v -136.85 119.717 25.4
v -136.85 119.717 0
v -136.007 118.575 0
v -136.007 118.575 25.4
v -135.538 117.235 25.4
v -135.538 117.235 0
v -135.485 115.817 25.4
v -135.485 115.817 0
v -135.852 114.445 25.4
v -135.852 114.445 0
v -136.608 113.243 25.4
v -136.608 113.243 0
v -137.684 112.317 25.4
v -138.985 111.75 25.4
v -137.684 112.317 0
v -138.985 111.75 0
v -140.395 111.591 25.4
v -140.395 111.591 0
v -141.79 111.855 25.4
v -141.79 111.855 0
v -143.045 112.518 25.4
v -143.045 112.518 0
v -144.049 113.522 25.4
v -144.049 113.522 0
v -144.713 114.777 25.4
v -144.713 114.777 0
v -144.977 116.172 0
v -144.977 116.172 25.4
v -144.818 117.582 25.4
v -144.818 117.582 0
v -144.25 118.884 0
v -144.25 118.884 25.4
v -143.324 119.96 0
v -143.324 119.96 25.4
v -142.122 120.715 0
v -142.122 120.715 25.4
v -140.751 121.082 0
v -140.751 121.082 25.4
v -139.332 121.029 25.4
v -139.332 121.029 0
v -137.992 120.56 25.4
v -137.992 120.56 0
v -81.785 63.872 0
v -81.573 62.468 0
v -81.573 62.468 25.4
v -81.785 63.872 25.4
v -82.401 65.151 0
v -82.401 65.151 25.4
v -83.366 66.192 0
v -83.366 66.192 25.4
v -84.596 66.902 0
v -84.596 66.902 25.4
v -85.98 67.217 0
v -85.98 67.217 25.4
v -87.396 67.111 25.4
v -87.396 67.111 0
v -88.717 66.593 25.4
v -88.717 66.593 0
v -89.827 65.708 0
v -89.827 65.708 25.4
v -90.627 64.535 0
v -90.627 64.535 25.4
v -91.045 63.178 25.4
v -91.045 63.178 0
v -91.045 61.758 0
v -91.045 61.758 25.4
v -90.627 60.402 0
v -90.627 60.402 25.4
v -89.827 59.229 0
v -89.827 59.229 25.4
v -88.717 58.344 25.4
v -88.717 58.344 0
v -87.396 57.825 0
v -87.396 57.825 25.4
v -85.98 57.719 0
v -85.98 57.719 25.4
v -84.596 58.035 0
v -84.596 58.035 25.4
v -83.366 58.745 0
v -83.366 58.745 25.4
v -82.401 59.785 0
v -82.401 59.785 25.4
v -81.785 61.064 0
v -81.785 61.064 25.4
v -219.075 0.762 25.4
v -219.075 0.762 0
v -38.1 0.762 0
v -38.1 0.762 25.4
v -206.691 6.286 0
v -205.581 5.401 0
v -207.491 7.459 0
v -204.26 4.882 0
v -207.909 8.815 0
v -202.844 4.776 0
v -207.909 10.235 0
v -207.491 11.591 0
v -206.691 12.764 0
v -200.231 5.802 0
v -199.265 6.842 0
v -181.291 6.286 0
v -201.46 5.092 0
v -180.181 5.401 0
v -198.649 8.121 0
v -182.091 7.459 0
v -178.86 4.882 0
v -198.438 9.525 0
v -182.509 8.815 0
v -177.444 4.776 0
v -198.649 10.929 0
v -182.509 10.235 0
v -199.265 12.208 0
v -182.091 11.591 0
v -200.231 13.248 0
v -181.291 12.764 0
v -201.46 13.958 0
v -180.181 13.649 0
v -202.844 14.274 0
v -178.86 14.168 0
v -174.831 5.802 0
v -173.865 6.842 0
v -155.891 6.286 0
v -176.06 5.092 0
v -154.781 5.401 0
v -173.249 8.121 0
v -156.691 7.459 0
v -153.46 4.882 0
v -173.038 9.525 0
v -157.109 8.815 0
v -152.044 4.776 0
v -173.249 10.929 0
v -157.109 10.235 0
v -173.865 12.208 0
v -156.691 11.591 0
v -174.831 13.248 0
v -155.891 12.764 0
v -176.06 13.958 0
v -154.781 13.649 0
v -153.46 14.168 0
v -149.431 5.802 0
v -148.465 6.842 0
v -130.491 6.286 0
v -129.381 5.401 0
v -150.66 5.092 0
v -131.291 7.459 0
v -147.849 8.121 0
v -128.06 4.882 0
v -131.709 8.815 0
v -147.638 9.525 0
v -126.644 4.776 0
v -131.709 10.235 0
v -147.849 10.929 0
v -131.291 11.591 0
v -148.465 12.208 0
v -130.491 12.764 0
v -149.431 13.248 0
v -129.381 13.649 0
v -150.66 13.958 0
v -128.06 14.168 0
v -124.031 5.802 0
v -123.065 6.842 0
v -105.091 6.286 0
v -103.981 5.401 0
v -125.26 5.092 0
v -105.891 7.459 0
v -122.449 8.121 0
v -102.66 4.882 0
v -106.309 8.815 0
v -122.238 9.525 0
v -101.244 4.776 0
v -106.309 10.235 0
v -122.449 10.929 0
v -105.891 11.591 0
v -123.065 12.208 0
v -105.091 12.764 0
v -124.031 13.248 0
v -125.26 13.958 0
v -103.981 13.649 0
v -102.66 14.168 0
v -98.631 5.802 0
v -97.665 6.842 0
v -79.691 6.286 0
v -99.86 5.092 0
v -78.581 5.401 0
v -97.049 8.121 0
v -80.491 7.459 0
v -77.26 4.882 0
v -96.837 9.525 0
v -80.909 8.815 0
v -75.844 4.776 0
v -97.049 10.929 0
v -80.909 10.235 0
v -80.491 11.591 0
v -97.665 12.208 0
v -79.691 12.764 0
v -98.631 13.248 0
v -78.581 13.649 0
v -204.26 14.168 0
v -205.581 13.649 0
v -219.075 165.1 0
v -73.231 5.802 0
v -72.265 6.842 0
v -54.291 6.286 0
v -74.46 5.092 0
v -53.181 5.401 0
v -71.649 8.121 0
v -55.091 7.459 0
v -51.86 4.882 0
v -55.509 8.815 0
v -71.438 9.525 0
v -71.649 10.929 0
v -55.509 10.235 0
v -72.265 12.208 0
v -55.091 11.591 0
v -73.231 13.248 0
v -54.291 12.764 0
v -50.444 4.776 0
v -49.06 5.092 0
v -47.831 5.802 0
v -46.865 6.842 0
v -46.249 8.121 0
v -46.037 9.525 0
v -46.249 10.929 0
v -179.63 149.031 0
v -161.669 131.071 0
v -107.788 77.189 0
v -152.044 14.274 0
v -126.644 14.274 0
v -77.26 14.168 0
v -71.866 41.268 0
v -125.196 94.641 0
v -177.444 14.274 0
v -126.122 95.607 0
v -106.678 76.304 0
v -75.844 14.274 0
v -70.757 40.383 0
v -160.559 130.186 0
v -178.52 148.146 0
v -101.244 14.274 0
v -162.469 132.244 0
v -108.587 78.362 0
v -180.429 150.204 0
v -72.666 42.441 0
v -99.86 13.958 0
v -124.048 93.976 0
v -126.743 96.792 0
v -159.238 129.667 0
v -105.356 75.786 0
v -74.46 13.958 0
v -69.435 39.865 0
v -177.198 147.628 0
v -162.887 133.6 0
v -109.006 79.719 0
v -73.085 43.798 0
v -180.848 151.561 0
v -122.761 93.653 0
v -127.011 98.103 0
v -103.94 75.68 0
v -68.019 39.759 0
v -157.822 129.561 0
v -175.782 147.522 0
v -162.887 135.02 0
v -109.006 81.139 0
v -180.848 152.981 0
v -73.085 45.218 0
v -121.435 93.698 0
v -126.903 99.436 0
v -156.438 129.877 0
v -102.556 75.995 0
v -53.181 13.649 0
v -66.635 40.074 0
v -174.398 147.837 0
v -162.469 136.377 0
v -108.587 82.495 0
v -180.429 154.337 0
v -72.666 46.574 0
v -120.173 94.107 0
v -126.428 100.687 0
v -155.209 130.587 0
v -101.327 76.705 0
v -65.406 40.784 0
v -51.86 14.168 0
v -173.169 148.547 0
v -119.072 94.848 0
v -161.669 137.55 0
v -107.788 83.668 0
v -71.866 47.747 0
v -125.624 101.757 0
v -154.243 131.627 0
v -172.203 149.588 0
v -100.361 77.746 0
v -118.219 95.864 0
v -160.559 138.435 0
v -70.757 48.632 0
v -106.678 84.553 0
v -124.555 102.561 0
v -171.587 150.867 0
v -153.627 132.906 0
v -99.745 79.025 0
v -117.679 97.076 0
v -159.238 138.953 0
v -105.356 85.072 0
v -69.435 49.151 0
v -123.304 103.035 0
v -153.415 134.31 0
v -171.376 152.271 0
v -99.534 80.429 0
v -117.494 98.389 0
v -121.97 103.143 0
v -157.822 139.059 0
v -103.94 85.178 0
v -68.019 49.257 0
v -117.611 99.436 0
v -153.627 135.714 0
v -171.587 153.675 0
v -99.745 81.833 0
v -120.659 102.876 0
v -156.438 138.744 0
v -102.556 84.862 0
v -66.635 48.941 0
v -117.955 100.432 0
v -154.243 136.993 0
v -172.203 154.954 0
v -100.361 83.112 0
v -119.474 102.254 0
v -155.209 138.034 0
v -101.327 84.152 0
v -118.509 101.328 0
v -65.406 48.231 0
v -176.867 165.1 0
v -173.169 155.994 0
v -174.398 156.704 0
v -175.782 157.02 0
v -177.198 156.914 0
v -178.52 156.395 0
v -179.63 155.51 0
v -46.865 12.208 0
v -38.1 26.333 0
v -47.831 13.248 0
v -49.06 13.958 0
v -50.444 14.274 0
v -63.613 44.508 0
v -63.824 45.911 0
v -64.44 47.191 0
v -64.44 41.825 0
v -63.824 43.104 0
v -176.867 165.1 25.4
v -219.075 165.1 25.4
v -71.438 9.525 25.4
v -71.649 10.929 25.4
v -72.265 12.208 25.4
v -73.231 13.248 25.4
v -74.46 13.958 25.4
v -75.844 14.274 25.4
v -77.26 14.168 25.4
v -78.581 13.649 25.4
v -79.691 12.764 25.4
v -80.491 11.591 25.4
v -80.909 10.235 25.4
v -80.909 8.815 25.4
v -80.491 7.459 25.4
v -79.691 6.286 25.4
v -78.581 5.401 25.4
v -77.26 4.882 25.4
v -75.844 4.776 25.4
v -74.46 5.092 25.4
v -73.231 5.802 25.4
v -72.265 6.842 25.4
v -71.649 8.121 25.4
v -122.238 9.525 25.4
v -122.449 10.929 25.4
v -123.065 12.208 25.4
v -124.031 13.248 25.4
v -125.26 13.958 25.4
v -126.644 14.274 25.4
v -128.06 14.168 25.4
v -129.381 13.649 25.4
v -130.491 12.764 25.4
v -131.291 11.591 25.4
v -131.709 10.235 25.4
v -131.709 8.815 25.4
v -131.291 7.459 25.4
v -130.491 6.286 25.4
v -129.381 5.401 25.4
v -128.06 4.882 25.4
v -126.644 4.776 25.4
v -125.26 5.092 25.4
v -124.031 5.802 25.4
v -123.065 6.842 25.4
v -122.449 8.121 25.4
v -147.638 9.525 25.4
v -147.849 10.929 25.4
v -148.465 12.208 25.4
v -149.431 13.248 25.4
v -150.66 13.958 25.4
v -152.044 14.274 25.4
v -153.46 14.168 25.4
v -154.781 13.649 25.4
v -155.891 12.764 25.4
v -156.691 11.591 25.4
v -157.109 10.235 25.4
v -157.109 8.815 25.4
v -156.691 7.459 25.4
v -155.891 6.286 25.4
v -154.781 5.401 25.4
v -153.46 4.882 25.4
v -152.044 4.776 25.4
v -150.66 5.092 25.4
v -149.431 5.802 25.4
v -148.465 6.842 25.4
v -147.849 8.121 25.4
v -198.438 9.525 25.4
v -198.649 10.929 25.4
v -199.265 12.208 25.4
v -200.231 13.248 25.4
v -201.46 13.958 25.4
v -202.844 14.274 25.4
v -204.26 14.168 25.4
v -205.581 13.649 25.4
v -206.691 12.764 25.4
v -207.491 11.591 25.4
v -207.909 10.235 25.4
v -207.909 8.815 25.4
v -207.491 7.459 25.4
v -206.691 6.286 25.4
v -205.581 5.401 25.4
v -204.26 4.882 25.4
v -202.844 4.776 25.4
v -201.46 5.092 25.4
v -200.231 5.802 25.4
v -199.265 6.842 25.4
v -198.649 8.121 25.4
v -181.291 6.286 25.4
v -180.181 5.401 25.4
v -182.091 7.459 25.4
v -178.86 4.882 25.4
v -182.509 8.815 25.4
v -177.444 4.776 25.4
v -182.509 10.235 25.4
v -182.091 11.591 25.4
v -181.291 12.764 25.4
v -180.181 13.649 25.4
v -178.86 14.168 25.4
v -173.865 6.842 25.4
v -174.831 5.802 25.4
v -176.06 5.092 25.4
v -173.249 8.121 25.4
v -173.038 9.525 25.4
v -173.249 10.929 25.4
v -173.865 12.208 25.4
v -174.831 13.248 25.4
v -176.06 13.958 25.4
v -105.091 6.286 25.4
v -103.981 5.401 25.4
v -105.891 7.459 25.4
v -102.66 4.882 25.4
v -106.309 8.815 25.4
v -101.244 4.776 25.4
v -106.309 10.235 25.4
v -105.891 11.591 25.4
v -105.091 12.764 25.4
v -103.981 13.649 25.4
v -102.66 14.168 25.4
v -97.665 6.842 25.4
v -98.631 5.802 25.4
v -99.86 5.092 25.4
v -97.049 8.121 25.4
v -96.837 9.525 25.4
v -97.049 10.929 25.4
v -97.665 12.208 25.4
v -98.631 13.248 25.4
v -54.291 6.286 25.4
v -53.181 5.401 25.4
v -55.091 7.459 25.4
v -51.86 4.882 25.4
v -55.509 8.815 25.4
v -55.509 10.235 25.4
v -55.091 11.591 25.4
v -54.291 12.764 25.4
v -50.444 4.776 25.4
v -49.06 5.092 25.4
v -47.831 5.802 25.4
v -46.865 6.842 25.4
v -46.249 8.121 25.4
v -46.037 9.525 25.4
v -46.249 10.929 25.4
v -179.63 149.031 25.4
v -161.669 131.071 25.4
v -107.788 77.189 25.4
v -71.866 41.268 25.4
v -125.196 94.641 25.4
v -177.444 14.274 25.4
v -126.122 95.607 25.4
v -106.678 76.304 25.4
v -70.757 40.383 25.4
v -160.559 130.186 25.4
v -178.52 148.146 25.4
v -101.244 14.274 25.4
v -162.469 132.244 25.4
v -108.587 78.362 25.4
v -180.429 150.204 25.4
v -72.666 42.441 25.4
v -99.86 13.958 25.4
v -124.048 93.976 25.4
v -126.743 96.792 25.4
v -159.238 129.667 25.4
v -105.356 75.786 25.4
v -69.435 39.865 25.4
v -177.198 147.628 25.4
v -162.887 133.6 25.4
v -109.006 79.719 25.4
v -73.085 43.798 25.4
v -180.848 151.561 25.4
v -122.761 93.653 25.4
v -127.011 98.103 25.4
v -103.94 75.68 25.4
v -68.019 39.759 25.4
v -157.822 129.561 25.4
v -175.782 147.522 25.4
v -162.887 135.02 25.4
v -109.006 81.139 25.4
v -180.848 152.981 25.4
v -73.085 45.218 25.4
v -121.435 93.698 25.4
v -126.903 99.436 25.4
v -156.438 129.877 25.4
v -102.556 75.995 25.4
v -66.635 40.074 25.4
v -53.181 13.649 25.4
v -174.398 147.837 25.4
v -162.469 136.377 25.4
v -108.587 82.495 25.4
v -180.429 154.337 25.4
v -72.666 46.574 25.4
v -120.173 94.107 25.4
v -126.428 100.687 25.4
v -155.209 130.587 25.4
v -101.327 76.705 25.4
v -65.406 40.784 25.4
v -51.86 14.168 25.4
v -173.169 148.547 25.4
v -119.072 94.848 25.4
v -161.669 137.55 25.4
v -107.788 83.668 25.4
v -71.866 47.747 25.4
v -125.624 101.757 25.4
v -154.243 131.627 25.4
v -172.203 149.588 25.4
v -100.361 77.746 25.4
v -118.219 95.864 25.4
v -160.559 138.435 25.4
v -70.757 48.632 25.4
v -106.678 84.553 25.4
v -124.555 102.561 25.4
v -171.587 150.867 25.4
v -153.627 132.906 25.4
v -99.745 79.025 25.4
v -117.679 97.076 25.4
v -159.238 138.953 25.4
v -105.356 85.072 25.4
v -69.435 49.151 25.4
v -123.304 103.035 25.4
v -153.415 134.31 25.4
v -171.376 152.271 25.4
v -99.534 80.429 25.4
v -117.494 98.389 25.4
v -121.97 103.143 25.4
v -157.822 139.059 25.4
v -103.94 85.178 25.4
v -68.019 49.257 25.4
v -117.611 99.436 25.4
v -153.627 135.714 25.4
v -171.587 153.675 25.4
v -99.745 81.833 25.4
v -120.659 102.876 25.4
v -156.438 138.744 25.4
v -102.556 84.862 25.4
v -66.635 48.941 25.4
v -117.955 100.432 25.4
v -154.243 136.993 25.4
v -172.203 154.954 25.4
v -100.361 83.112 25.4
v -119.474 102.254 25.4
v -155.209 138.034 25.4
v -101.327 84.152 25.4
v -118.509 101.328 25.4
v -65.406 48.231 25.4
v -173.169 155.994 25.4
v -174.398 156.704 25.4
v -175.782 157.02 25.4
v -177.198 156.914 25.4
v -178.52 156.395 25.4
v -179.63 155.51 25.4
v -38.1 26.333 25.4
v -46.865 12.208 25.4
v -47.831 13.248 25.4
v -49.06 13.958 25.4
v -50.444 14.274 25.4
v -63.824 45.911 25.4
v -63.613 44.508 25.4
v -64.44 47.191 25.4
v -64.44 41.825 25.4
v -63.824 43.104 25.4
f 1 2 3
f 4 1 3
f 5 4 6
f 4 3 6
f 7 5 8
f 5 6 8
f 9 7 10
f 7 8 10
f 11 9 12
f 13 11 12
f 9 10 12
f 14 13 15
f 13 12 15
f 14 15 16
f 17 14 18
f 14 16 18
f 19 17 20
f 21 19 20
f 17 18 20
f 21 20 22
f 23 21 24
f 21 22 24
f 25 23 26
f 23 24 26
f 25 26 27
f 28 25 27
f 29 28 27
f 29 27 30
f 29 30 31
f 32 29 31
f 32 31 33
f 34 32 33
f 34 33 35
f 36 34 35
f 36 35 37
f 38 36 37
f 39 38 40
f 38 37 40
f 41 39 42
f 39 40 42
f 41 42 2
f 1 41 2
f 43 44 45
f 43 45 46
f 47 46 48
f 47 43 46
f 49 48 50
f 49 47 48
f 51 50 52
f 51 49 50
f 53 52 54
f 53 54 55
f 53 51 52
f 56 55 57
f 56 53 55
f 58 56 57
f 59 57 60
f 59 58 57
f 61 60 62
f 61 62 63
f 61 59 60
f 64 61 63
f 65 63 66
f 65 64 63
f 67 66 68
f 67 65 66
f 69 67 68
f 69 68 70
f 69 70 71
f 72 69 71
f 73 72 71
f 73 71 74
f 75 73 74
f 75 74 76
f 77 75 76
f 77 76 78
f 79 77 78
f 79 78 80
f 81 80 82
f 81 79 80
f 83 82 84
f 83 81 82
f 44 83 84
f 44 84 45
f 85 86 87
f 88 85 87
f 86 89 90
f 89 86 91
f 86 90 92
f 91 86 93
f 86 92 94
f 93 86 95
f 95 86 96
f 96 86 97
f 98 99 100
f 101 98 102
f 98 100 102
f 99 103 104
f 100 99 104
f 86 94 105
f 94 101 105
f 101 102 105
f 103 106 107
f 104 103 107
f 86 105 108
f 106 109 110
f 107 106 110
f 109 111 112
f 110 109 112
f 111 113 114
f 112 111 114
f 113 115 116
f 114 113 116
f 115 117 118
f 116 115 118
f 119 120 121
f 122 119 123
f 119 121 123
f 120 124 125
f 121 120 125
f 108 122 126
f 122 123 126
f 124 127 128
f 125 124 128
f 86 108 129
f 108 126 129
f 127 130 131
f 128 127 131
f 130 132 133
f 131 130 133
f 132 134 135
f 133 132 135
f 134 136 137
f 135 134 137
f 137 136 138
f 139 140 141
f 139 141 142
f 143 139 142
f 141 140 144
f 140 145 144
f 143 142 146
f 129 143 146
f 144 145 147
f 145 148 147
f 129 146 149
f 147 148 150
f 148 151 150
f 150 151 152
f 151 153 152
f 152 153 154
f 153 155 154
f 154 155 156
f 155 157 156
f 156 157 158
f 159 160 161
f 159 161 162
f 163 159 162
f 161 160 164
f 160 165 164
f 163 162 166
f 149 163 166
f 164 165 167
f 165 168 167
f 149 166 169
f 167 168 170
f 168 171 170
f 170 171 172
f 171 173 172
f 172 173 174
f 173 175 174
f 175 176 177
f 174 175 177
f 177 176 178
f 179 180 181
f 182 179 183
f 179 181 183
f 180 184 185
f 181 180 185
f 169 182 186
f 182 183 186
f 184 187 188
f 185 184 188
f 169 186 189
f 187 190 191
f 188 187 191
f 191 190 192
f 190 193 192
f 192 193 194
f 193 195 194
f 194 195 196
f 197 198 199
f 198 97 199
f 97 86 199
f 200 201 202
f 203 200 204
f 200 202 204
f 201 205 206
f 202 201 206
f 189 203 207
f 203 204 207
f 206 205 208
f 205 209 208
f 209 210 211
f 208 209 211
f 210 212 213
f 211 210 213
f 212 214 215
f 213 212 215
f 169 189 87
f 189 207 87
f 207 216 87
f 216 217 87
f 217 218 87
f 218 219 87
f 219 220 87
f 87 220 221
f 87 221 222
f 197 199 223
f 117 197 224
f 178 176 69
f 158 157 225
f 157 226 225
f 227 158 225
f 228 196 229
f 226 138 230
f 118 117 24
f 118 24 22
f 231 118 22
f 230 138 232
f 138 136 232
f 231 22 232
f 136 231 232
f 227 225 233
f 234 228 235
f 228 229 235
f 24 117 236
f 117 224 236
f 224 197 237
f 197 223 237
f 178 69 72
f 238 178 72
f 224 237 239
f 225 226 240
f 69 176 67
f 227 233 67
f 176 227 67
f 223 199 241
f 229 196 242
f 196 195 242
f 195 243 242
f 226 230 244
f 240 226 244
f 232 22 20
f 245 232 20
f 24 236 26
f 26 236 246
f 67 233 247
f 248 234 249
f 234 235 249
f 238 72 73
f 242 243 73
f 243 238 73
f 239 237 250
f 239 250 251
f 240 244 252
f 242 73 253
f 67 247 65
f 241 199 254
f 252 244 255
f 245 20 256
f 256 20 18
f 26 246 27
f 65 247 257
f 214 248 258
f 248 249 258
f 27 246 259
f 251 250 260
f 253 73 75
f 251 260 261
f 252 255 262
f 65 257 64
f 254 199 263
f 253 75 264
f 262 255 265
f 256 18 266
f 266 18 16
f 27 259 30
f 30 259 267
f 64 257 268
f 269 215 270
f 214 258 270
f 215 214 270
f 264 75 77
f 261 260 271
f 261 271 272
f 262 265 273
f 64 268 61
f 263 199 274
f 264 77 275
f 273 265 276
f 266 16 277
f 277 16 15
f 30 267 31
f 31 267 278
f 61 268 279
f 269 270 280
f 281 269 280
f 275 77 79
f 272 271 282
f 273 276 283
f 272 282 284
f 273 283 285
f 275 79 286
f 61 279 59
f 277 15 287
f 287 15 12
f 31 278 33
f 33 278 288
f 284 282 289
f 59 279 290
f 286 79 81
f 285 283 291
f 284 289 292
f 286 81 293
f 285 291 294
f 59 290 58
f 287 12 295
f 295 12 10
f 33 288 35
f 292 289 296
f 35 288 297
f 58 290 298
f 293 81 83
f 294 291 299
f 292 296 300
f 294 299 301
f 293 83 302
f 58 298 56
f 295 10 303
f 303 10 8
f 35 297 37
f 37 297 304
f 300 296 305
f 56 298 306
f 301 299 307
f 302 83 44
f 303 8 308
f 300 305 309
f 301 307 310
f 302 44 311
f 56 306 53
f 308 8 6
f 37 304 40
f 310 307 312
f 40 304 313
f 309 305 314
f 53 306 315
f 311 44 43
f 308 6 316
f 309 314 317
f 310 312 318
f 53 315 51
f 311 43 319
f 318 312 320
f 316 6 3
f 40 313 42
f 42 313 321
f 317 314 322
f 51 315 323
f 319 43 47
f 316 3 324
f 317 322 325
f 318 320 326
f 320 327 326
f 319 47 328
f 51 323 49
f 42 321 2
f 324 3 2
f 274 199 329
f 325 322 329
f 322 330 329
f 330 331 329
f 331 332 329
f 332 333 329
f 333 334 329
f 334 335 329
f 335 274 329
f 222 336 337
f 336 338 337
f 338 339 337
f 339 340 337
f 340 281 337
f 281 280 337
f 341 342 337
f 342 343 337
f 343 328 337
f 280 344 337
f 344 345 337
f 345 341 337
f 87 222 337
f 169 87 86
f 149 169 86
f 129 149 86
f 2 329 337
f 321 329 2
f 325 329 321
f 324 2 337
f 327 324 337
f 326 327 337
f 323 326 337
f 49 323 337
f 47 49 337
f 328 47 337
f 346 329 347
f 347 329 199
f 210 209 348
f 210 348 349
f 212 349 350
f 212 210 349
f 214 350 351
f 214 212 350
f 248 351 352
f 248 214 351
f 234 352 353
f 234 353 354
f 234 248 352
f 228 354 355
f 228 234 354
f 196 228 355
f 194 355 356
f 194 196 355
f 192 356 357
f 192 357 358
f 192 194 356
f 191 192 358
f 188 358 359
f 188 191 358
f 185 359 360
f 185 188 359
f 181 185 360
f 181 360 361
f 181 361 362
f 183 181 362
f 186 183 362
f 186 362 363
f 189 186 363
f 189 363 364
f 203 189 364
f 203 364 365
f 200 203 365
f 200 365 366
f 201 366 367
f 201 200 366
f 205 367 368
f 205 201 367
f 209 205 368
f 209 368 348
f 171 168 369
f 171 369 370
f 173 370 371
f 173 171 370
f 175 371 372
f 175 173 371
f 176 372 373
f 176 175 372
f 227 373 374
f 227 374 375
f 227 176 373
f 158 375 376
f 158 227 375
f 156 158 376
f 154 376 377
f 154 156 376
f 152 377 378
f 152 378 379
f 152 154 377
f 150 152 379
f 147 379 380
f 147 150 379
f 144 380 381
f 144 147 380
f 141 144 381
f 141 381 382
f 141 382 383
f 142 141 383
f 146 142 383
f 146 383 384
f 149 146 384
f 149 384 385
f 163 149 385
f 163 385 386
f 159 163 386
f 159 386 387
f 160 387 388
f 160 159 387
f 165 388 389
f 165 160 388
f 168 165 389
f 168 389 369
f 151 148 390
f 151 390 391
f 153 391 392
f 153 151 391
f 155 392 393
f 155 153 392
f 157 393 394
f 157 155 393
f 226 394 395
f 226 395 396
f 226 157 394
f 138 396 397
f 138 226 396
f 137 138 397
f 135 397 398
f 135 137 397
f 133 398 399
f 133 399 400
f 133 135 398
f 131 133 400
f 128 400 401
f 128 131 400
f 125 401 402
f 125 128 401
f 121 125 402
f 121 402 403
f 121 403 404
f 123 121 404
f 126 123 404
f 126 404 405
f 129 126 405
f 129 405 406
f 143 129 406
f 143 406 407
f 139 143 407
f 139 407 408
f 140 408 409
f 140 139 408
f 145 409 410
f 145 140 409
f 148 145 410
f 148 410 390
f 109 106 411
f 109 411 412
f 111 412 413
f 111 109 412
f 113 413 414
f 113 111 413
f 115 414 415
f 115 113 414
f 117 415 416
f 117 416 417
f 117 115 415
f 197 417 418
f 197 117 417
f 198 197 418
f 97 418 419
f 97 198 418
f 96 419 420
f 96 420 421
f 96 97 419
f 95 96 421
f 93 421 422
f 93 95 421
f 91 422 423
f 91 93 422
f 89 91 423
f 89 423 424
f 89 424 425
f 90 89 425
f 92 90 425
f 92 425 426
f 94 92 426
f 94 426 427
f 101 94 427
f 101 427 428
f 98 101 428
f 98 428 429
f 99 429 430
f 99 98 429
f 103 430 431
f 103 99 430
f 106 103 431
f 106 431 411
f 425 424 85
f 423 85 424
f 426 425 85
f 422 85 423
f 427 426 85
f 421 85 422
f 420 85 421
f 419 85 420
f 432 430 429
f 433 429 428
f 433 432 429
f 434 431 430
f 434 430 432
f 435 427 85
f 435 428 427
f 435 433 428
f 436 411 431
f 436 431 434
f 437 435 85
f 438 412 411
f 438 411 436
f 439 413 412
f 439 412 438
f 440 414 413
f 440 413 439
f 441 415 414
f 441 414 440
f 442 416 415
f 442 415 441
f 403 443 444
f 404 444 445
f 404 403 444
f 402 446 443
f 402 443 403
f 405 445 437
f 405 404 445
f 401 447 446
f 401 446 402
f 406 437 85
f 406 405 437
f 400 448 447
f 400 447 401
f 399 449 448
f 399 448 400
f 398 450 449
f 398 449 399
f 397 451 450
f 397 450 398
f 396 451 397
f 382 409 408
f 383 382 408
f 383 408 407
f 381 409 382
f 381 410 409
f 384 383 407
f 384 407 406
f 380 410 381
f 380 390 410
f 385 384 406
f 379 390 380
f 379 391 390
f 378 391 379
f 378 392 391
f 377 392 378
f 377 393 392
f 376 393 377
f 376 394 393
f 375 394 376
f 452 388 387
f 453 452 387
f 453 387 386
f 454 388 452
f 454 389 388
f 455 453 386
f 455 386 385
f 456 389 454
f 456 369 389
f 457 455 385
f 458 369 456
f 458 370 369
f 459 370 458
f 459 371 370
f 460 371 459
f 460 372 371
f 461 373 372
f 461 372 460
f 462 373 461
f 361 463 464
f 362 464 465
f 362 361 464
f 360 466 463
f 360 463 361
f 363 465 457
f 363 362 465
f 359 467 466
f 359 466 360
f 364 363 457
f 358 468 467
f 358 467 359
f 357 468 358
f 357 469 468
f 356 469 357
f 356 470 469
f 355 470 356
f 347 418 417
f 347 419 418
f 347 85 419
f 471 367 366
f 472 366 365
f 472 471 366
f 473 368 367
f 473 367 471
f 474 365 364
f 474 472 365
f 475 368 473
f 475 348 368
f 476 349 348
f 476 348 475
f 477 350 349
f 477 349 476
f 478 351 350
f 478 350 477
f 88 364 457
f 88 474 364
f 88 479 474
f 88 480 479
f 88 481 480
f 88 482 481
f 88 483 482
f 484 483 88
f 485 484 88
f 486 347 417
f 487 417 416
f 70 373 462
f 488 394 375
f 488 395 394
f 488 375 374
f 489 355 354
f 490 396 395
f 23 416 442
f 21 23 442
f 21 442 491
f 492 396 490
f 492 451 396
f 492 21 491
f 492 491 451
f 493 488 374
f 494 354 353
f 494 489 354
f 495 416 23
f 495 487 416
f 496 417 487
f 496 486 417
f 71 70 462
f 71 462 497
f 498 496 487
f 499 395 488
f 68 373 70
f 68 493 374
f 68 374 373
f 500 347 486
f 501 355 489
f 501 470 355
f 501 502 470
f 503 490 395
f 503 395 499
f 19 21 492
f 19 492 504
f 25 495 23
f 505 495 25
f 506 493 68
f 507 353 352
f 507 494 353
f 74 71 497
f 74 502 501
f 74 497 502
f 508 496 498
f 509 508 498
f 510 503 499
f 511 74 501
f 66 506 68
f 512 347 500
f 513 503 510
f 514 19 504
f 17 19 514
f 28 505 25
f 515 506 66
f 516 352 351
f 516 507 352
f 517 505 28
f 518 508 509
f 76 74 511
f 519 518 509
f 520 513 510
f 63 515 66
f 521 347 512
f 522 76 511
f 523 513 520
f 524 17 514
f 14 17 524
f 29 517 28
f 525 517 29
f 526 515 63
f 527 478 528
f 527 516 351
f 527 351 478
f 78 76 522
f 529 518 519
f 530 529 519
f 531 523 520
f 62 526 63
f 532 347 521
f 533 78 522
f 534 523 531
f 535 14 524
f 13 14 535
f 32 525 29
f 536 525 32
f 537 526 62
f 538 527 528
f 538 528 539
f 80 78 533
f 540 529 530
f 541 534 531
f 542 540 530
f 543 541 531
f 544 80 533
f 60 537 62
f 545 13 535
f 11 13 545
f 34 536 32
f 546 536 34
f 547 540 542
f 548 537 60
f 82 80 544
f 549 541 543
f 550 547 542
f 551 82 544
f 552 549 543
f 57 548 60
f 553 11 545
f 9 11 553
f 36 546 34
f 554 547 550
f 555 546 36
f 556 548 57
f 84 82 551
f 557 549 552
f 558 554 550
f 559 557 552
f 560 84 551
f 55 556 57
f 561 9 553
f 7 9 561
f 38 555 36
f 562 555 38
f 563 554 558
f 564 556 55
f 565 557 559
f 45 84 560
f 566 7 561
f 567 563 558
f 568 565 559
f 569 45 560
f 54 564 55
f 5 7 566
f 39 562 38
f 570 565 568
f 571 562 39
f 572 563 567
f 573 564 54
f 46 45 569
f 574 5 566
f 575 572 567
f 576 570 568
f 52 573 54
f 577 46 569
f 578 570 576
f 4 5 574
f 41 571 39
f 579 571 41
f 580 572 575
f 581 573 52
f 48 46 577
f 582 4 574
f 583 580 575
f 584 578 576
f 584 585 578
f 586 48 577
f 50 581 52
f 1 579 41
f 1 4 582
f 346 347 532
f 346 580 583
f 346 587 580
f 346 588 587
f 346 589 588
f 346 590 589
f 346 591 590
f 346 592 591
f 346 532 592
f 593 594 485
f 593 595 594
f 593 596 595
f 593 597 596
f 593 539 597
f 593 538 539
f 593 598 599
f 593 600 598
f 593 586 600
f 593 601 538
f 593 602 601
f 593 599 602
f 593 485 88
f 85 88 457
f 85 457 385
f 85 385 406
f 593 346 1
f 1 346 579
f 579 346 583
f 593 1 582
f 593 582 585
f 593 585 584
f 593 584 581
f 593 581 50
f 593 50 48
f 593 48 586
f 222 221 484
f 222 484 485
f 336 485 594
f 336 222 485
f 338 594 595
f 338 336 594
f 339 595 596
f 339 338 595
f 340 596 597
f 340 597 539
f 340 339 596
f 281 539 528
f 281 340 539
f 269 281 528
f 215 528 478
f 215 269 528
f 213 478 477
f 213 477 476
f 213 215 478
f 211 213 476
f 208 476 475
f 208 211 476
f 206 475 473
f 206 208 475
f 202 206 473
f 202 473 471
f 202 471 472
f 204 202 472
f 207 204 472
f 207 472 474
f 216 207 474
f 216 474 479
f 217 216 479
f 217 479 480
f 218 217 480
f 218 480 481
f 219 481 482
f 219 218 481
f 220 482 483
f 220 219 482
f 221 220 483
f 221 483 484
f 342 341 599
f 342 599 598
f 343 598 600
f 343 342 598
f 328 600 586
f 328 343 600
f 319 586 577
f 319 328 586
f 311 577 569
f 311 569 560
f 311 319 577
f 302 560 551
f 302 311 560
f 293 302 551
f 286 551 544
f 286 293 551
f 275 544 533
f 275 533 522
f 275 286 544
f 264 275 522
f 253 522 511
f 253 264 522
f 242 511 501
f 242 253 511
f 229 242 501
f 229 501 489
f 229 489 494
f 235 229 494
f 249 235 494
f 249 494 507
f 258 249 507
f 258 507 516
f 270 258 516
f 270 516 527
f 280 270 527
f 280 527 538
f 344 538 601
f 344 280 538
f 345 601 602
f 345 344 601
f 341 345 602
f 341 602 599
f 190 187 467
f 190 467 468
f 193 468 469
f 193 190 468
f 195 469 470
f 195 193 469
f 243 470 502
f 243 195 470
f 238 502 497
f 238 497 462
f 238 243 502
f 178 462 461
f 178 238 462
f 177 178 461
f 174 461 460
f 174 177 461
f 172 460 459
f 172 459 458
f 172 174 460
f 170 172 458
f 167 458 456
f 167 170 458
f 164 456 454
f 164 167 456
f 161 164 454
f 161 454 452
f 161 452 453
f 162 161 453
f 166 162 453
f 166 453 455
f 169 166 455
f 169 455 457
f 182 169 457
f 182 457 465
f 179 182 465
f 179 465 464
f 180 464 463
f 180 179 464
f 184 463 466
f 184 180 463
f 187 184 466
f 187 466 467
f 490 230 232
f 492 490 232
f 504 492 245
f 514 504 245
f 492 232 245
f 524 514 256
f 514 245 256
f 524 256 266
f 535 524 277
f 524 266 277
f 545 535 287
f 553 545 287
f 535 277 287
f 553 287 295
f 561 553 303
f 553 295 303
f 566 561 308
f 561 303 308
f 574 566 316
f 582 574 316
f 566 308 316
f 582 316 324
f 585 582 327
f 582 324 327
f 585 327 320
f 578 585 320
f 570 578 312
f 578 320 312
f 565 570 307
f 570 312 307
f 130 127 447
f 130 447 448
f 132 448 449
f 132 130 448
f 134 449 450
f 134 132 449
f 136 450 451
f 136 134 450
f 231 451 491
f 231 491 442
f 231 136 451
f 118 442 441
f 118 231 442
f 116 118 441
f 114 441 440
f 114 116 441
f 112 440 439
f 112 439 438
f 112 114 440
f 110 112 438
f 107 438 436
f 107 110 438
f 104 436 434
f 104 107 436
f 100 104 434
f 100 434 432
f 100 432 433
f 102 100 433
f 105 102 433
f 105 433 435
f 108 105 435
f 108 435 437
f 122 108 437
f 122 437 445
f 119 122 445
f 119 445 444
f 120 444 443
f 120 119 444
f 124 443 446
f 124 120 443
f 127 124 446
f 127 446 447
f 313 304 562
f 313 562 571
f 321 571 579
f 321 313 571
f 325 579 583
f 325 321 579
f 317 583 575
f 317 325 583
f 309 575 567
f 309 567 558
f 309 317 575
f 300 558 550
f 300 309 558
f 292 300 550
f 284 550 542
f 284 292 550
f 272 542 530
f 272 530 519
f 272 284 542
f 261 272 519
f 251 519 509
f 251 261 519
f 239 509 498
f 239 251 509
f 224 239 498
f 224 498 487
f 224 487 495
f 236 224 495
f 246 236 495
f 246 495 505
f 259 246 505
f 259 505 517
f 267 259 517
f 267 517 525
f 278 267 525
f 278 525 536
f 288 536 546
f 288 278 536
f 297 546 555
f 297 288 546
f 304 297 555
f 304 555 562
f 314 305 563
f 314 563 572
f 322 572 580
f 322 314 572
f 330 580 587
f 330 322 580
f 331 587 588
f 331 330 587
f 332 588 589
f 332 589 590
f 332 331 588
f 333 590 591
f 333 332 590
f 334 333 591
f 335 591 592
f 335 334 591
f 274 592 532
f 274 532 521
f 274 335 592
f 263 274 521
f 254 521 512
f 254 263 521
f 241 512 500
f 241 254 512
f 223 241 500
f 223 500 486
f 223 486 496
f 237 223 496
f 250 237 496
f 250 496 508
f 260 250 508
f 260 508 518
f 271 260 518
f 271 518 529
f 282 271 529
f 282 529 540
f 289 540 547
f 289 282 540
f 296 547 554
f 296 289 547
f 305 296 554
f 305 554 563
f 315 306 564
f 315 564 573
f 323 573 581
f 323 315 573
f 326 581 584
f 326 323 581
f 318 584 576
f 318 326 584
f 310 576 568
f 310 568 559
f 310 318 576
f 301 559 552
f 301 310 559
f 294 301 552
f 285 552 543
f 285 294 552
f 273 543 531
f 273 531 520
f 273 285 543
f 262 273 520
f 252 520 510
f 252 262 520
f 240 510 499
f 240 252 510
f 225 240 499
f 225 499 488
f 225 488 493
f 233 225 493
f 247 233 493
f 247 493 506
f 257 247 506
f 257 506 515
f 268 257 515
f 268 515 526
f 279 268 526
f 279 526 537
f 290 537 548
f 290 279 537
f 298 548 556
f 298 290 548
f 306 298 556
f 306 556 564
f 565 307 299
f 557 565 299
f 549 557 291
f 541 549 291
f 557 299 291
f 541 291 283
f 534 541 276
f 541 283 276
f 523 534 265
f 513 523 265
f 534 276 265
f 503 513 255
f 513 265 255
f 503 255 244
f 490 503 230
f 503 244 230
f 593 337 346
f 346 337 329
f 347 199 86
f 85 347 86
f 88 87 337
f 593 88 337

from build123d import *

# Parameters (mm, degrees)
F0_R     = 4.7625
F1_DEPTH = 25.4


with BuildPart() as f1:
    # F0 (on Top) → F1 (new body)
    with BuildSketch(Plane.XY):
        Polygon((-219.075, 165.1), (-219.075, 19.05), (-200.787, 19.05), (-128.5875, 91.2495), (-146.9525612107, 109.6145612107), (-202.438, 165.1), align=None)
        Polygon((-38.1, 0.762), (-38.1, 19.05), (-200.787, 19.05), (-219.075, 0.762), align=None)
        with Locations((-203.2, 9.525)):
            Circle(F0_R, mode=Mode.SUBTRACT)
        with Locations((-177.8, 9.525)):
            Circle(F0_R, mode=Mode.SUBTRACT)
        with Locations((-152.4, 9.525)):
            Circle(F0_R, mode=Mode.SUBTRACT)
        with Locations((-127, 9.525)):
            Circle(F0_R, mode=Mode.SUBTRACT)
        with Locations((-101.6, 9.525)):
            Circle(F0_R, mode=Mode.SUBTRACT)
        with Locations((-76.2, 9.525)):
            Circle(F0_R, mode=Mode.SUBTRACT)
        with Locations((-50.8, 9.525)):
            Circle(F0_R, mode=Mode.SUBTRACT)
        with BuildLine():
            Line((-125.1955164365, 94.6414835635), (-128.5875, 91.2495))
            Line((-128.5875, 91.2495), (-57.15, 19.812))
            Line((-57.15, 19.812), (-44.3645546077, 32.5974453923))
            Line((-44.3645546077, 32.5974453923), (-115.8020546077, 104.0349453923))
            Line((-115.8020546077, 104.0349453923), (-118.5090993819, 101.3279006181))
            ThreePointArc((-118.5090993819, 101.3279006181), (-117.7551848926, 99.9437041782), (-117.4943568778, 98.3892410594))
            ThreePointArc((-117.4943568778, 98.3892410594), (-120.1728655028, 94.1069068595), (-125.1955164365, 94.6414835635))
        make_face()
        with Locations((-68.3753201513, 44.5077043329)):
            Circle(F0_R, mode=Mode.SUBTRACT)
        with Locations((-86.3358323935, 62.4682165751)):
            Circle(F0_R, mode=Mode.SUBTRACT)
        with Locations((-104.2963446356, 80.4287288172)):
            Circle(F0_R, mode=Mode.SUBTRACT)
        Polygon((-200.787, 19.05), (-219.075, 19.05), (-219.075, 0.762), align=None)
        with BuildLine():
            Line((-176.8671092154, 165.1), (-202.438, 165.1))
            Line((-202.438, 165.1), (-146.9525612107, 109.6145612107))
            Line((-146.9525612107, 109.6145612107), (-143.5849651653, 112.9821572561))
            ThreePointArc((-143.5849651653, 112.9821572561), (-143.5849651653, 119.7173493469), (-136.8497730745, 119.7173493469))
            Line((-136.8497730745, 119.7173493469), (-134.1671158184, 122.400006603))
            Line((-134.1671158184, 122.400006603), (-176.8671092154, 165.1))
        make_face()
        with Locations((-158.177881362, 134.3102655436)):
            Circle(F0_R, mode=Mode.SUBTRACT)
        with Locations((-176.1383936042, 152.2707777858)):
            Circle(F0_R, mode=Mode.SUBTRACT)
        with BuildLine():
            Line((-146.9525612107, 109.6145612107), (-128.5875, 91.2495))
            Line((-128.5875, 91.2495), (-125.1955164365, 94.6414835635))
            ThreePointArc((-125.1955164365, 94.6414835635), (-125.6244529232, 101.7568371048), (-118.5090993819, 101.3279006181))
            Line((-118.5090993819, 101.3279006181), (-115.8020546077, 104.0349453923))
            Line((-115.8020546077, 104.0349453923), (-134.1671158184, 122.400006603))
            Line((-134.1671158184, 122.400006603), (-136.8497730745, 119.7173493469))
            ThreePointArc((-136.8497730745, 119.7173493469), (-135.8173928463, 118.1722831481), (-135.4548691199, 116.3497533015))
            ThreePointArc((-135.4548691199, 116.3497533015), (-138.3948392733, 111.9497770279), (-143.5849651653, 112.9821572561))
            Line((-143.5849651653, 112.9821572561), (-146.9525612107, 109.6145612107))
        make_face()
        Polygon((-200.787, 19.05), (-38.1, 19.05), (-38.1, 26.3328907846), (-44.3645546077, 32.5974453923), (-57.15, 19.812), (-128.5875, 91.2495), align=None)
    extrude(amount=F1_DEPTH)


solid = f1.part
